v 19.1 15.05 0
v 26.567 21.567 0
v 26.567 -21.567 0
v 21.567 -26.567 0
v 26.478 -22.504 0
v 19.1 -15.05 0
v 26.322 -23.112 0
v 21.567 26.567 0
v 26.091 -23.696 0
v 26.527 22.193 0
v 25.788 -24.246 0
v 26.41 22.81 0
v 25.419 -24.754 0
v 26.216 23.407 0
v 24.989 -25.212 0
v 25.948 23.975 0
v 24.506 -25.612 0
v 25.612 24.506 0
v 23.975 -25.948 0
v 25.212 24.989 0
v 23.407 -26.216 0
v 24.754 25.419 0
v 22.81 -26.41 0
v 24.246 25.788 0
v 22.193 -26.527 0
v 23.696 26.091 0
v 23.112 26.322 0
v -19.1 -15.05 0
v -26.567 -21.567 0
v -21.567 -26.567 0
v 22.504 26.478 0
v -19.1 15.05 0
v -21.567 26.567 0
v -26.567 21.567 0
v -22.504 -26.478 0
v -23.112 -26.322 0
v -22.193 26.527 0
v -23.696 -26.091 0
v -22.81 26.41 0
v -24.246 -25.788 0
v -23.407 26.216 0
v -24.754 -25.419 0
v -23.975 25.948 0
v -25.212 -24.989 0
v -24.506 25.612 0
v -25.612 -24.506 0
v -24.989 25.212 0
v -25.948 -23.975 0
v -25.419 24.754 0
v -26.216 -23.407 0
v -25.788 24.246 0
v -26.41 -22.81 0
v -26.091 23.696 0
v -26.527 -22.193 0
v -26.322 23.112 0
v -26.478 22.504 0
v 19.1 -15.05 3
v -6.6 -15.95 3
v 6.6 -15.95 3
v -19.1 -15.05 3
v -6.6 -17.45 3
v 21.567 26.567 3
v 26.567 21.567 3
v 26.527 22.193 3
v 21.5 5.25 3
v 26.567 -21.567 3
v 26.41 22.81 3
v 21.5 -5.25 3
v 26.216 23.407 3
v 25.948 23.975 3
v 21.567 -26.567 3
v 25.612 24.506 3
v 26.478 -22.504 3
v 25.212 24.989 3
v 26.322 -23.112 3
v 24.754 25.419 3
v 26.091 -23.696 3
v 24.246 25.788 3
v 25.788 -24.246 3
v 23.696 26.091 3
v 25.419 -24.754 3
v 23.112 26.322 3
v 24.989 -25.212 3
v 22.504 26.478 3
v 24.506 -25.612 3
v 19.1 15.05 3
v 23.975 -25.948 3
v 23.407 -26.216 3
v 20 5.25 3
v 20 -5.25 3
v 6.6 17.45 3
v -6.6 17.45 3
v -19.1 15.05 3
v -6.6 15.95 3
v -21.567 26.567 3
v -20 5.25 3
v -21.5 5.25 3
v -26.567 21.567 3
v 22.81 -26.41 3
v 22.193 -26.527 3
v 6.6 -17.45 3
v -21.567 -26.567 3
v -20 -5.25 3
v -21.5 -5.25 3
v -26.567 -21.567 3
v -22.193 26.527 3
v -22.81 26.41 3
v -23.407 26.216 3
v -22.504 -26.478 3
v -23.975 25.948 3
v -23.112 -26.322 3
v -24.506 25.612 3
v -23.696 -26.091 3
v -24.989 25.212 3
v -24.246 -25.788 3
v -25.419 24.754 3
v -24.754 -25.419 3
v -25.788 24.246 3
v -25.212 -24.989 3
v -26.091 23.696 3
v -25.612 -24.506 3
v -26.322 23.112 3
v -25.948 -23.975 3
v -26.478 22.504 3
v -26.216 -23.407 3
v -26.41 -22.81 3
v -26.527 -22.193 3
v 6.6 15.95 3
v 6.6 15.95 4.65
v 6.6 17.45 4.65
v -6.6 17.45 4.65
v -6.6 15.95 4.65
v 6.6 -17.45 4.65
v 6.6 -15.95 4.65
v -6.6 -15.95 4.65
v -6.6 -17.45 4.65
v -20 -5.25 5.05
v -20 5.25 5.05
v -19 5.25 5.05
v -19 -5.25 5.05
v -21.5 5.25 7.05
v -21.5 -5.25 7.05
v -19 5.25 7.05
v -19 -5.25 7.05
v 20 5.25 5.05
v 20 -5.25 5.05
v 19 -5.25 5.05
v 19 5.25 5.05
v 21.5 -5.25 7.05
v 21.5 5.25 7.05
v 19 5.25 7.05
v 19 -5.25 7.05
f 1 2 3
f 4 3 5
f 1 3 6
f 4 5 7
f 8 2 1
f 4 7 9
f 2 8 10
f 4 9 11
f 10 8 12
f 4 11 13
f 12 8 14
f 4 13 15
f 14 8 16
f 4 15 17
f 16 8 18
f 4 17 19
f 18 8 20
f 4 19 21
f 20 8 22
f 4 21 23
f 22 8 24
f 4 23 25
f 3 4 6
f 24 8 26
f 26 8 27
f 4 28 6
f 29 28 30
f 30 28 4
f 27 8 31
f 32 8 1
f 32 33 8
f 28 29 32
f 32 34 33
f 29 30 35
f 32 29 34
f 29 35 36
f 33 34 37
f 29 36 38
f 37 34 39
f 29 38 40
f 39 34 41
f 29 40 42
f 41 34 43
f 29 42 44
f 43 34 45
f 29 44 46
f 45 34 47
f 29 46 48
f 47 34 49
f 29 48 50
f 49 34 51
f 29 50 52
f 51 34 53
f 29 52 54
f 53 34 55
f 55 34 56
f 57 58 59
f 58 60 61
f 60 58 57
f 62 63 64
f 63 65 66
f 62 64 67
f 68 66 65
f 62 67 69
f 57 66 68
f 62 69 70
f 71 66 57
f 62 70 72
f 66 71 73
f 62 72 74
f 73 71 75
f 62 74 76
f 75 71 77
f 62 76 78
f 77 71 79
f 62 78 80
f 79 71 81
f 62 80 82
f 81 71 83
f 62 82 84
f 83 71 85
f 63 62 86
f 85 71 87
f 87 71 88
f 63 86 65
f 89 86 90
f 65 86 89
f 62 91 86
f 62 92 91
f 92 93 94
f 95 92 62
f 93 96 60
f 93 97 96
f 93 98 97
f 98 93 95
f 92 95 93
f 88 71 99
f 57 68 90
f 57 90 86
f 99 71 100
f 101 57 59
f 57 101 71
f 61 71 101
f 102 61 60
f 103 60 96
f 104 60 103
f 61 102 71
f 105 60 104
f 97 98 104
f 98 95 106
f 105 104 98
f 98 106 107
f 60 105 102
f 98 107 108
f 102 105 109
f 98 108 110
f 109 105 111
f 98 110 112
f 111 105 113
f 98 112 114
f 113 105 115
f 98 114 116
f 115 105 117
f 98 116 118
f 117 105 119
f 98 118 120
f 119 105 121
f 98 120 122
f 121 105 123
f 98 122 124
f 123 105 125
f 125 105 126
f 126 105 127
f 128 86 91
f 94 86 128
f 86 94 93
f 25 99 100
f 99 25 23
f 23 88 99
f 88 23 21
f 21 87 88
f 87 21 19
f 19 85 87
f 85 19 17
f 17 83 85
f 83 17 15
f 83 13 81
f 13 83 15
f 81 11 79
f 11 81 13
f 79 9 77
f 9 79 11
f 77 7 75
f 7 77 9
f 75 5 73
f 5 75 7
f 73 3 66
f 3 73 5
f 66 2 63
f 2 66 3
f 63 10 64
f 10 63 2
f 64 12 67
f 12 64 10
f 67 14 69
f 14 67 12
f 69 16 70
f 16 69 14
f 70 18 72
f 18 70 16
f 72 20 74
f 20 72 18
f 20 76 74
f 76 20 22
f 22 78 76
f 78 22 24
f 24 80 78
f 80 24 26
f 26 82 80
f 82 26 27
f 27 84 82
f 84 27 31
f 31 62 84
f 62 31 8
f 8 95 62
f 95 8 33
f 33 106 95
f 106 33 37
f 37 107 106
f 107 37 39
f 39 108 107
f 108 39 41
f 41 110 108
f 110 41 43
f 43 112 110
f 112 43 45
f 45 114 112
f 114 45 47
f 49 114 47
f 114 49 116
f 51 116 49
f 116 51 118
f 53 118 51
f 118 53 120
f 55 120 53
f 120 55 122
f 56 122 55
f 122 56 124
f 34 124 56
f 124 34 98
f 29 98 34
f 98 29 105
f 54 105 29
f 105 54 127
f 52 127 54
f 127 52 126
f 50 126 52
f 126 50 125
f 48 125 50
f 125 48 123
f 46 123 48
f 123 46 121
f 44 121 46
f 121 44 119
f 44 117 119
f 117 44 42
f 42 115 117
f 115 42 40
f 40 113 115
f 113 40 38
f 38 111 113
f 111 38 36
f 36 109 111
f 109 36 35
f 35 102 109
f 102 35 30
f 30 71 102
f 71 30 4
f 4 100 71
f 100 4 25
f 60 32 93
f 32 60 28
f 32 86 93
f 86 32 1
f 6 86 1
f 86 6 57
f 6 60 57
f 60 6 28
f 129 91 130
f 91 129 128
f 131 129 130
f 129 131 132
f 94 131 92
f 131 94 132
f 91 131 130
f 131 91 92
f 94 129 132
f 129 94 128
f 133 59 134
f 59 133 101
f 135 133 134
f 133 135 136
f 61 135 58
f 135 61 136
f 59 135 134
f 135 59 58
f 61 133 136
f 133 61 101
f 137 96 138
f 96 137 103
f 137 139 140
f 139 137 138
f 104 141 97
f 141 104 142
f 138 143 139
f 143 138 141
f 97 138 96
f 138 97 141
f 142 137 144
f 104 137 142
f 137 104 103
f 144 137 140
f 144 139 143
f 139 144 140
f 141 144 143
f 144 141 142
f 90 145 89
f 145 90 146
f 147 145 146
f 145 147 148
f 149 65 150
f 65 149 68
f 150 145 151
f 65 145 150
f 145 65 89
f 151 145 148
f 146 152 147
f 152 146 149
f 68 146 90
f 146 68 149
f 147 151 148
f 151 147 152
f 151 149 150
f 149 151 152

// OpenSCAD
/* [PCB selection - NOT WORKING YET] */
your_pcb = "foo"; // [arduino_uno, arduino_mega, rp4]

////////////////////////////////////////////////////////////////////////////////
/* [Main parameters] */
grid_spacing = 40;

pcb_width_default = 39.6;
pcb_depth_default = 31.5;
pcb_height = 1.65;
swap_tabs = false;
swap_dimensions = false;
pcb_width = swap_dimensions ? pcb_depth_default : pcb_width_default;
pcb_depth = swap_dimensions ? pcb_width_default : pcb_depth_default;
external_Ltabs = false;
fixed_L_tab = false;
fixed_L_tab_length = 5;
L_tabs_offset = 0; // [-20:0.5:20]

////////////////////////////////////////////////////////////////////////////////
/* [Secondary parameters] */
hole_diam = 3; // for screw
nut_min_diam = 5.4; // for nuts
tolerance = 0.2; // used fo 3D printing
min_border = 1.5; // minimal dist. from nut to the outter border of the board
pcb_offset = 0.7; // protruding border below the pcb

////////////////////////////////////////////////////////////////////////////////
/* [Change at your own risks] */
fillet_radius = 5;
nut_max_diam = nut_min_diam * 2 / sqrt(3);
board_height = 3;
board_width_min = ceil(pcb_width + (nut_max_diam + tolerance * 2 + min_border) * 2 + min_border * 2);
echo(board_width_min);
board_width = ceil(board_width_min / grid_spacing) * grid_spacing/1.5 - tolerance;
holes_dist_width_min = ceil(pcb_width + (nut_max_diam + tolerance * 2) + min_border * 2);
holes_dist_width = ceil(holes_dist_width_min / grid_spacing) * grid_spacing;
board_depth_min = ceil(pcb_width + (nut_max_diam + tolerance * 2 + min_border) * 2 + min_border * 2);
board_depth = ceil(board_depth_min / grid_spacing) * grid_spacing/1.5 - tolerance;
holes_dist_depth_min = floor(pcb_depth - (nut_max_diam + tolerance * 2) / 2 - min_border * 2);
holes_dist_depth = ceil(holes_dist_depth_min / grid_spacing) * grid_spacing;
L_tab_hook_length = 1.5;
simple_tabs_width = 1.5;


xtab_length = swap_tabs ? pcb_depth/2 : pcb_width / 3; //tabs along x axis
ytab_length = swap_tabs ? (fixed_L_tab ? fixed_L_tab_length : pcb_width / 3) : (fixed_L_tab ? fixed_L_tab_length : pcb_depth / 3); //tabs along y axis

L_hook = 1;

////////////////////////////////////////////////////////////////////////////////
/*Code*/

// Module for symmetry
module mirror_copy(v = [1, 0, 0]) {
  children();
  mirror(v) children();
}

// Board with holes
difference() {
  // Create the board
  linear_extrude(height=board_height) {
    difference() {
      offset($fn=50, r=fillet_radius) {
        square([board_width - fillet_radius * 2, board_depth - fillet_radius * 2], center=true);
      }
      square([pcb_width - pcb_offset * 2, pcb_depth - pcb_offset * 2], center=true);
    }
  }
  // holes
  mirror_copy([0, 1, 0]) mirror_copy() translate([holes_dist_width / 2, holes_dist_depth / 2, 0]) {
        cylinder($fn=50, h=board_height * 2, r=hole_diam / 2 + tolerance);
      }
  // nut holes
  mirror_copy([0, 1, 0]) mirror_copy() translate([holes_dist_width / 2, holes_dist_depth / 2, board_height / 2]) {
        cylinder($fn=6, h=board_height * 2, r=(nut_max_diam / 2 + tolerance));
      }
}

if (swap_tabs) {
  //Swapped tabs
  // L tabs
  if (external_Ltabs){
  mirror([1, 0, 0])
  mirror_copy([0, 1, 0]) translate([pcb_width/2-ytab_length+ L_tabs_offset, pcb_depth / 2 + tolerance, board_height]) {
      cube([ytab_length, simple_tabs_width, pcb_height + tolerance * 2], center=false);
      // translate([0,0,pcb_height+tolerance*2]){
      translate([0, -L_hook, pcb_height + tolerance * 2]) {
        cube([ytab_length, simple_tabs_width + L_hook, 2]);
      }
    }
      mirror_copy([0, 1, 0]) translate([pcb_width/2-ytab_length+ L_tabs_offset, pcb_depth / 2 + tolerance, board_height]) {
      cube([ytab_length, simple_tabs_width, pcb_height + tolerance * 2], center=false);
      // translate([0,0,pcb_height+tolerance*2]){
      translate([0, -L_hook, pcb_height + tolerance * 2]) {
        cube([ytab_length, simple_tabs_width + L_hook, 2]);
      }
    }
  }
  else {
  mirror_copy([0, 1, 0]) translate([-ytab_length / 2 + L_tabs_offset, pcb_depth / 2 + tolerance, board_height]) {
      cube([ytab_length, simple_tabs_width, pcb_height + tolerance * 2], center=false);
      // translate([0,0,pcb_height+tolerance*2]){
      translate([0, -L_hook, pcb_height + tolerance * 2]) {
        cube([ytab_length, simple_tabs_width + L_hook, 2]);
      }
    }
  }
  // simple tabs
  mirror_copy([1, 0, 0]) translate([-pcb_width / 2 - tolerance - simple_tabs_width, -xtab_length / 2, board_height]) {
      cube([L_tab_hook_length, xtab_length, pcb_height]);
    }
} else // Default tabs positionning
{
  // simple tabs, along x
  mirror_copy([0, 1, 0]) translate([-xtab_length / 2, pcb_depth / 2 + tolerance, board_height]) {
      cube([xtab_length, simple_tabs_width, pcb_height], center=false);
    }
  // L tabs, along y
  if (external_Ltabs){
  mirror([0, 1, 0])
    mirror_copy([1, 0, 0]) translate([-pcb_width / 2 - tolerance - simple_tabs_width, pcb_depth/2-ytab_length- L_tabs_offset, board_height]) {
      cube([simple_tabs_width, ytab_length, pcb_height + tolerance * 2]);
      translate([0, 0, pcb_height + tolerance * 2]) {
        cube([L_tab_hook_length + L_hook, ytab_length, 2]);
      }
    }
        mirror_copy([1, 0, 0]) translate([-pcb_width / 2 - tolerance - simple_tabs_width, pcb_depth/2-ytab_length- L_tabs_offset, board_height]) {
      cube([simple_tabs_width, ytab_length, pcb_height + tolerance * 2]);
      translate([0, 0, pcb_height + tolerance * 2]) {
        cube([L_tab_hook_length + L_hook, ytab_length, 2]);
      }
    }
  }
  else{
  mirror_copy([1, 0, 0]) translate([-pcb_width / 2 - tolerance - simple_tabs_width, -ytab_length / 2 + L_tabs_offset, board_height]) {
      cube([simple_tabs_width, ytab_length, pcb_height + tolerance * 2]);
      translate([0, 0, pcb_height + tolerance * 2]) {
        cube([L_tab_hook_length + L_hook, ytab_length, 2]);
      }
    }
  }
  
}
// THE END
